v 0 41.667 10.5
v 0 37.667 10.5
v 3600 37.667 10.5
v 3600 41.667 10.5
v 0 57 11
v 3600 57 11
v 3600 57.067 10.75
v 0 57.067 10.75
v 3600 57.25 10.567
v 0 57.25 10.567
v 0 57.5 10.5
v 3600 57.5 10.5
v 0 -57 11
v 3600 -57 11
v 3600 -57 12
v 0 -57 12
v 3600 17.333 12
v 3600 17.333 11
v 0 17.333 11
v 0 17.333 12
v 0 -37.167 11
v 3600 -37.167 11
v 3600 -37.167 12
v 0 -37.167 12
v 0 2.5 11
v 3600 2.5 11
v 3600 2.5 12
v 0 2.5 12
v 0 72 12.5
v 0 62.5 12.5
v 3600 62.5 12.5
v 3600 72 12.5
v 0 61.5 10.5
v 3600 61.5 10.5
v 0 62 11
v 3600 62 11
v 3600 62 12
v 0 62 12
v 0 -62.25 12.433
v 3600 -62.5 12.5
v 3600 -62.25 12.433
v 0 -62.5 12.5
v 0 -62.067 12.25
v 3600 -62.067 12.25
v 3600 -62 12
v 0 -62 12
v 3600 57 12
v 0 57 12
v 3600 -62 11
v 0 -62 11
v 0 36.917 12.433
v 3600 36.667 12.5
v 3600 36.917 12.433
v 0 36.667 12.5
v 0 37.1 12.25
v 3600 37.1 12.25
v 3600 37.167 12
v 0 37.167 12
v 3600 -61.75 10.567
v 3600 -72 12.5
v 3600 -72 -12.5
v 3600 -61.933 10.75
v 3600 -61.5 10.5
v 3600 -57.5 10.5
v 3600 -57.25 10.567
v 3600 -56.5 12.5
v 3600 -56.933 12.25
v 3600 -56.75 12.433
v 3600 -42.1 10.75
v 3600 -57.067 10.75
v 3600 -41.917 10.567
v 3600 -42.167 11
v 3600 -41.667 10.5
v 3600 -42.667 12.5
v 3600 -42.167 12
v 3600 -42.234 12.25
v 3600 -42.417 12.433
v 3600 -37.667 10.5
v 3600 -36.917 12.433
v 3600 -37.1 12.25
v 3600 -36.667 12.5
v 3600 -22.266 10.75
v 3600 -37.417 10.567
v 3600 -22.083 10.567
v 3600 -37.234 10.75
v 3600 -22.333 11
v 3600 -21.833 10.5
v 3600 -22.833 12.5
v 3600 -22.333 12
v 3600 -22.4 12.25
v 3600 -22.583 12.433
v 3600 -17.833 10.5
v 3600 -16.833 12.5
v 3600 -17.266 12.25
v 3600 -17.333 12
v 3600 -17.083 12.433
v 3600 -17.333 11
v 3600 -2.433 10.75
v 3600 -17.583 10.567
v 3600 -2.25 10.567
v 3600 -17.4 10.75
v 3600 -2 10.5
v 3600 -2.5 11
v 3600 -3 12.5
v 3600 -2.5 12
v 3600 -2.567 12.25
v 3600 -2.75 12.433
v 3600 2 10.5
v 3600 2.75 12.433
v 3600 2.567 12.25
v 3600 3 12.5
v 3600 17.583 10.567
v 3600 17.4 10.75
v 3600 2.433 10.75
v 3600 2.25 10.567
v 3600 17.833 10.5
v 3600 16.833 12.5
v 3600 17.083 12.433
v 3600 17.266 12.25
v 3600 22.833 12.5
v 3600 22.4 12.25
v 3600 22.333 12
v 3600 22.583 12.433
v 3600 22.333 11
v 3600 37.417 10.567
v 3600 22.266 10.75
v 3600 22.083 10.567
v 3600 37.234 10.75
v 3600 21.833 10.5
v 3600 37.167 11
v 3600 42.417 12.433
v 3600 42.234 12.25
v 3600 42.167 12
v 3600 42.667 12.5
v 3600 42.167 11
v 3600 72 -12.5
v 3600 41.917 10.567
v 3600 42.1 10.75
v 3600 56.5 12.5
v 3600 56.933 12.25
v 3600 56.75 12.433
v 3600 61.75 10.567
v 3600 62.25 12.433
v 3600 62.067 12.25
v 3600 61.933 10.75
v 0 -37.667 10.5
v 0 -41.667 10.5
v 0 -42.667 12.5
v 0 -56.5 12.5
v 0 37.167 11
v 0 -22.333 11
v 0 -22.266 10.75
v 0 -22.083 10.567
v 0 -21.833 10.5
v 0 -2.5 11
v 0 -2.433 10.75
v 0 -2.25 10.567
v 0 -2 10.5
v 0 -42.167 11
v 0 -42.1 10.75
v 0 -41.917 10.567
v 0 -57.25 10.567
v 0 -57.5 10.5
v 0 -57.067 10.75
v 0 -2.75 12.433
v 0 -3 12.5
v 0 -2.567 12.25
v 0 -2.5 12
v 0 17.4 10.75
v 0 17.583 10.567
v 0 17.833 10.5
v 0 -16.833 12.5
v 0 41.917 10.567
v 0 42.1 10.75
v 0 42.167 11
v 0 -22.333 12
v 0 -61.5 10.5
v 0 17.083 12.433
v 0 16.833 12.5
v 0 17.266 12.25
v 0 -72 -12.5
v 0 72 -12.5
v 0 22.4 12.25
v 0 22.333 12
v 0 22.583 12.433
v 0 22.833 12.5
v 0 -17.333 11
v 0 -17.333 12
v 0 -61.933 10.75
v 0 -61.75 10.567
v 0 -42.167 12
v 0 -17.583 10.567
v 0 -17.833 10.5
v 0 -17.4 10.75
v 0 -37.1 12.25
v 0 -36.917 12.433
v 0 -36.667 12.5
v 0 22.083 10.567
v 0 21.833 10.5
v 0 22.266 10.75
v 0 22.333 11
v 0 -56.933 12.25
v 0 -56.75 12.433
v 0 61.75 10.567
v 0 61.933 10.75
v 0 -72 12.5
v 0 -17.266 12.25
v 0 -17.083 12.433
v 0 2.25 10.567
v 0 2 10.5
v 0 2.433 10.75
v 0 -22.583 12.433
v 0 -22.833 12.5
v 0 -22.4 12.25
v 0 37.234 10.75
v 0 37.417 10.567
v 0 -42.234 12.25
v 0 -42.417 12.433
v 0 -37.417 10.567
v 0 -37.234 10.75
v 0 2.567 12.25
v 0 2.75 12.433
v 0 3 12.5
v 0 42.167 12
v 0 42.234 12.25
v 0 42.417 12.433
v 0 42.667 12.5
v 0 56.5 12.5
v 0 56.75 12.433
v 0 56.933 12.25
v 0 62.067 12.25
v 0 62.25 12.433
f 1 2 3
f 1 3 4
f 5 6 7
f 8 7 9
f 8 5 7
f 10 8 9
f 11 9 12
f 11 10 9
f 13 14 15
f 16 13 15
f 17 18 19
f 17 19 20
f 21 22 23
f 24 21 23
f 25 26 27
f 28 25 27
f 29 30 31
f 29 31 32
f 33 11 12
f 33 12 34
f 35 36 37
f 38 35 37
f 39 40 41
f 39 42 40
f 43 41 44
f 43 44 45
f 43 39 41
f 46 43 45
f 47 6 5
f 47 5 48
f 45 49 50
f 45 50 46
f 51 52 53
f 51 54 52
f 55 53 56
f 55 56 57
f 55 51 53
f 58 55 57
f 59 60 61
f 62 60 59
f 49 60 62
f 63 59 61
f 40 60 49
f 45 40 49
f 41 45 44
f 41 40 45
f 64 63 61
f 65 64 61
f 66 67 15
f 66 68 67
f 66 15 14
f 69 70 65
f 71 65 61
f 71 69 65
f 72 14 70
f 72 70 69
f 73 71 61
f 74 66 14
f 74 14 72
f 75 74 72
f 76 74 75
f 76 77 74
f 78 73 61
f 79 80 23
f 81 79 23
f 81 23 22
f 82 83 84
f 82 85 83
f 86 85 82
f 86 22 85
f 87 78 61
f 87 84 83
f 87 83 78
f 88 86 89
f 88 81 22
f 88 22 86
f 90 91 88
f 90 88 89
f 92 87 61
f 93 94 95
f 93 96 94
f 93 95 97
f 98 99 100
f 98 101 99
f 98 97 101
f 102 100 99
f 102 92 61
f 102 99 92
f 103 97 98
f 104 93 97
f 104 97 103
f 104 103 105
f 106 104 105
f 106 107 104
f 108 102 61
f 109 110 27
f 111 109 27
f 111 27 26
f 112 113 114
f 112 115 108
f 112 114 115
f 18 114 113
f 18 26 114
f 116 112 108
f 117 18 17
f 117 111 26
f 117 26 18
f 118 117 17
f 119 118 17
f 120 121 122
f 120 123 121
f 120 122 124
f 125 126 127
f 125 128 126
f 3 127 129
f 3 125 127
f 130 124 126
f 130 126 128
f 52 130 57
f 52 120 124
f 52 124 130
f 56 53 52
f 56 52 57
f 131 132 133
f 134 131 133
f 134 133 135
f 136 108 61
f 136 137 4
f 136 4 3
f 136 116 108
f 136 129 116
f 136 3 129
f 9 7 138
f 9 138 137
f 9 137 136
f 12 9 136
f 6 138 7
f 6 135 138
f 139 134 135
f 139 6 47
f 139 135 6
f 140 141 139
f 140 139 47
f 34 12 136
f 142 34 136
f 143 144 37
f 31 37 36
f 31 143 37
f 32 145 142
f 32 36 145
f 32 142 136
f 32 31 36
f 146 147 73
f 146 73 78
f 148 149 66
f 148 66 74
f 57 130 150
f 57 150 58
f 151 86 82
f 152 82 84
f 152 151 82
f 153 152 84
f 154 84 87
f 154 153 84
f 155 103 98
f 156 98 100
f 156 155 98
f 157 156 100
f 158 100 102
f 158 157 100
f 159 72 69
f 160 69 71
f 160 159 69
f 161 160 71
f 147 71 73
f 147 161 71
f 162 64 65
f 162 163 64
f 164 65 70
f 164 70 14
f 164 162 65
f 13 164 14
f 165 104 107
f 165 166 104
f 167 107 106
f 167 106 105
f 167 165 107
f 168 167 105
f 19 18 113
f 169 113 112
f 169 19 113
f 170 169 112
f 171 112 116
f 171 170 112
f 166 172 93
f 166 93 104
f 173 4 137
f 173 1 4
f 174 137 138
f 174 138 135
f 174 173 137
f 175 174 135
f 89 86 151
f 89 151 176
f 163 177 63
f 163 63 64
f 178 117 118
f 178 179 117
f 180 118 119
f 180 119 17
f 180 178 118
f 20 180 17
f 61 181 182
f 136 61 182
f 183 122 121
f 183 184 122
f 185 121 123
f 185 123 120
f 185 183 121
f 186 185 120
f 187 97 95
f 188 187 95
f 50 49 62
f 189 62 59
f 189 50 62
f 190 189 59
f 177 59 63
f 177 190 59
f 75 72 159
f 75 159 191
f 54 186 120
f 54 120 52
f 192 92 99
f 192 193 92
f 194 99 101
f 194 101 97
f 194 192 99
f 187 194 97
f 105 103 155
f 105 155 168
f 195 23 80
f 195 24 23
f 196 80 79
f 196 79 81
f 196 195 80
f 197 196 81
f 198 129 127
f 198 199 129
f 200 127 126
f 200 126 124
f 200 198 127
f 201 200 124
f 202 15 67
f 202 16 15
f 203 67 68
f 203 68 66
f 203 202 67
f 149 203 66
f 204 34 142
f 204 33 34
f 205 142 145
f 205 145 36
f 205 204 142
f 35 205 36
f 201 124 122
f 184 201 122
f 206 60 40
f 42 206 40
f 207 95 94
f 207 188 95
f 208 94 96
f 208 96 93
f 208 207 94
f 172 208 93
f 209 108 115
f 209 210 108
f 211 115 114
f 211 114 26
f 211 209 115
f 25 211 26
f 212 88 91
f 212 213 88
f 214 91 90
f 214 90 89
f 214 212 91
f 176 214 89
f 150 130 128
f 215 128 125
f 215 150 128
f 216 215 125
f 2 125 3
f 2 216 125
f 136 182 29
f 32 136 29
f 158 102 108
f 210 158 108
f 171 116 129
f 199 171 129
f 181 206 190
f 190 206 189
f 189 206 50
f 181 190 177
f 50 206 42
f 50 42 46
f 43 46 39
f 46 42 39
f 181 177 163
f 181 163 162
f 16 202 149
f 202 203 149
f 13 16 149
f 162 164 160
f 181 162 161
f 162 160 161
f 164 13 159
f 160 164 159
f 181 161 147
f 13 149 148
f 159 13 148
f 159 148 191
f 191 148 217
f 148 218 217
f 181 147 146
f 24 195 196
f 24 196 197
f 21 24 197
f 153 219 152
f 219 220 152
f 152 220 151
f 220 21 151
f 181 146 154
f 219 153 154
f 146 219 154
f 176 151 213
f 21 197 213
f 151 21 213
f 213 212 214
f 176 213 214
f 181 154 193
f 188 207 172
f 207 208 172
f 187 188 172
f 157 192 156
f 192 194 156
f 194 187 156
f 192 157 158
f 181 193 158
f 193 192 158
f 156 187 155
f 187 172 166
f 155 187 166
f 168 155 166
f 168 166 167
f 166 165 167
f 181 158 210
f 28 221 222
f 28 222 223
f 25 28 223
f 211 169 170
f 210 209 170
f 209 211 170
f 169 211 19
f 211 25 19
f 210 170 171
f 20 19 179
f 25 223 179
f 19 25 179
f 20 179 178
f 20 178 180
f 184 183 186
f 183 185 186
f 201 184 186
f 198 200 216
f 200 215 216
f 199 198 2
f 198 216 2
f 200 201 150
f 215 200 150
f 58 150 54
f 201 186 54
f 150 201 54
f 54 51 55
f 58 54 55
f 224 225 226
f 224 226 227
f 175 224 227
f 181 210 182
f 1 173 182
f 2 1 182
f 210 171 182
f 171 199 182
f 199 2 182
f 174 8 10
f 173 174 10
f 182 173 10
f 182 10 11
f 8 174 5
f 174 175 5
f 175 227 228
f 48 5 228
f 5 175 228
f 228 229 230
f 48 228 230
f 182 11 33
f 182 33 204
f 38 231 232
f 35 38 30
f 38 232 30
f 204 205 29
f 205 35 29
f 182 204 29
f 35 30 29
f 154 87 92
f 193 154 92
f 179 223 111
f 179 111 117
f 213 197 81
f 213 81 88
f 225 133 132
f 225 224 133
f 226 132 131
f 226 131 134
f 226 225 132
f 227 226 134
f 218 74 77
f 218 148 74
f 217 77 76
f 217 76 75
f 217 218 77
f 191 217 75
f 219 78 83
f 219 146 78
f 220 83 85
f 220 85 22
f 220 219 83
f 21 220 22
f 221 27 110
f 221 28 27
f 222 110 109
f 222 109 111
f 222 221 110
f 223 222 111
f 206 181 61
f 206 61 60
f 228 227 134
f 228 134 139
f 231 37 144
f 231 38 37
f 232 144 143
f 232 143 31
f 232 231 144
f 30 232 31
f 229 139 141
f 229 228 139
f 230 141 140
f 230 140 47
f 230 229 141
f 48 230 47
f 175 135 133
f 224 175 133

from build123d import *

# Parameters (mm, degrees)
F0_W     = 144
F0_H     = 25
F1_DEPTH = 3600
F2_W     = 5
F2_H     = 2
F3_DEPTH = 3600.001
F4_R     = 0.5


with BuildPart() as f1:
    # F0 (on Right) → F1 (new body)
    with BuildSketch(Plane.YZ):
        Rectangle(F0_W, F0_H)
    extrude(amount=F1_DEPTH)

    # F2 (on face) → F3 (cut, through all)
    with BuildSketch(Plane.YZ.offset(3600)):
        with Locations((-59.5, 11.5)):
            Rectangle(F2_W, F2_H)
        with Locations((-39.6666666667, 11.5)):
            Rectangle(F2_W, F2_H)
        with Locations((-19.8333333333, 11.5)):
            Rectangle(F2_W, F2_H)
        with Locations((0, 11.5)):
            Rectangle(F2_W, F2_H)
        with Locations((19.8333333333, 11.5)):
            Rectangle(F2_W, F2_H)
        with Locations((39.6666666667, 11.5)):
            Rectangle(F2_W, F2_H)
        with Locations((59.5, 11.5)):
            Rectangle(F2_W, F2_H)
    extrude(amount=-F3_DEPTH, mode=Mode.SUBTRACT)

    # F4
    f4_edges = [f1.edges().sort_by_distance(p)[0] for p in [
        (1800, -62, 12.5),
        (1800, -62, 10.5),
        (1800, -57, 12.5),
        (1800, -57, 10.5),
        (1800, -37.166667, 12.5),
        (1800, -37.166667, 10.5),
        (1800, -17.333333, 12.5),
        (1800, -17.333333, 10.5),
        (1800, 2.5, 12.5),
        (1800, 2.5, 10.5),
        (1800, 22.333333, 12.5),
        (1800, 22.333333, 10.5),
        (1800, 42.166667, 12.5),
        (1800, 42.166667, 10.5),
        (1800, 62, 12.5),
        (1800, 62, 10.5),
        (1800, 57, 12.5),
        (1800, 57, 10.5),
        (1800, 37.166667, 12.5),
        (1800, 37.166667, 10.5),
        (1800, 17.333333, 12.5),
        (1800, 17.333333, 10.5),
        (1800, -2.5, 12.5),
        (1800, -2.5, 10.5),
        (1800, -22.333333, 12.5),
        (1800, -22.333333, 10.5),
        (1800, -42.166667, 12.5),
        (1800, -42.166667, 10.5),
    ]]
    fillet(f4_edges, radius=F4_R)


solid = f1.part
